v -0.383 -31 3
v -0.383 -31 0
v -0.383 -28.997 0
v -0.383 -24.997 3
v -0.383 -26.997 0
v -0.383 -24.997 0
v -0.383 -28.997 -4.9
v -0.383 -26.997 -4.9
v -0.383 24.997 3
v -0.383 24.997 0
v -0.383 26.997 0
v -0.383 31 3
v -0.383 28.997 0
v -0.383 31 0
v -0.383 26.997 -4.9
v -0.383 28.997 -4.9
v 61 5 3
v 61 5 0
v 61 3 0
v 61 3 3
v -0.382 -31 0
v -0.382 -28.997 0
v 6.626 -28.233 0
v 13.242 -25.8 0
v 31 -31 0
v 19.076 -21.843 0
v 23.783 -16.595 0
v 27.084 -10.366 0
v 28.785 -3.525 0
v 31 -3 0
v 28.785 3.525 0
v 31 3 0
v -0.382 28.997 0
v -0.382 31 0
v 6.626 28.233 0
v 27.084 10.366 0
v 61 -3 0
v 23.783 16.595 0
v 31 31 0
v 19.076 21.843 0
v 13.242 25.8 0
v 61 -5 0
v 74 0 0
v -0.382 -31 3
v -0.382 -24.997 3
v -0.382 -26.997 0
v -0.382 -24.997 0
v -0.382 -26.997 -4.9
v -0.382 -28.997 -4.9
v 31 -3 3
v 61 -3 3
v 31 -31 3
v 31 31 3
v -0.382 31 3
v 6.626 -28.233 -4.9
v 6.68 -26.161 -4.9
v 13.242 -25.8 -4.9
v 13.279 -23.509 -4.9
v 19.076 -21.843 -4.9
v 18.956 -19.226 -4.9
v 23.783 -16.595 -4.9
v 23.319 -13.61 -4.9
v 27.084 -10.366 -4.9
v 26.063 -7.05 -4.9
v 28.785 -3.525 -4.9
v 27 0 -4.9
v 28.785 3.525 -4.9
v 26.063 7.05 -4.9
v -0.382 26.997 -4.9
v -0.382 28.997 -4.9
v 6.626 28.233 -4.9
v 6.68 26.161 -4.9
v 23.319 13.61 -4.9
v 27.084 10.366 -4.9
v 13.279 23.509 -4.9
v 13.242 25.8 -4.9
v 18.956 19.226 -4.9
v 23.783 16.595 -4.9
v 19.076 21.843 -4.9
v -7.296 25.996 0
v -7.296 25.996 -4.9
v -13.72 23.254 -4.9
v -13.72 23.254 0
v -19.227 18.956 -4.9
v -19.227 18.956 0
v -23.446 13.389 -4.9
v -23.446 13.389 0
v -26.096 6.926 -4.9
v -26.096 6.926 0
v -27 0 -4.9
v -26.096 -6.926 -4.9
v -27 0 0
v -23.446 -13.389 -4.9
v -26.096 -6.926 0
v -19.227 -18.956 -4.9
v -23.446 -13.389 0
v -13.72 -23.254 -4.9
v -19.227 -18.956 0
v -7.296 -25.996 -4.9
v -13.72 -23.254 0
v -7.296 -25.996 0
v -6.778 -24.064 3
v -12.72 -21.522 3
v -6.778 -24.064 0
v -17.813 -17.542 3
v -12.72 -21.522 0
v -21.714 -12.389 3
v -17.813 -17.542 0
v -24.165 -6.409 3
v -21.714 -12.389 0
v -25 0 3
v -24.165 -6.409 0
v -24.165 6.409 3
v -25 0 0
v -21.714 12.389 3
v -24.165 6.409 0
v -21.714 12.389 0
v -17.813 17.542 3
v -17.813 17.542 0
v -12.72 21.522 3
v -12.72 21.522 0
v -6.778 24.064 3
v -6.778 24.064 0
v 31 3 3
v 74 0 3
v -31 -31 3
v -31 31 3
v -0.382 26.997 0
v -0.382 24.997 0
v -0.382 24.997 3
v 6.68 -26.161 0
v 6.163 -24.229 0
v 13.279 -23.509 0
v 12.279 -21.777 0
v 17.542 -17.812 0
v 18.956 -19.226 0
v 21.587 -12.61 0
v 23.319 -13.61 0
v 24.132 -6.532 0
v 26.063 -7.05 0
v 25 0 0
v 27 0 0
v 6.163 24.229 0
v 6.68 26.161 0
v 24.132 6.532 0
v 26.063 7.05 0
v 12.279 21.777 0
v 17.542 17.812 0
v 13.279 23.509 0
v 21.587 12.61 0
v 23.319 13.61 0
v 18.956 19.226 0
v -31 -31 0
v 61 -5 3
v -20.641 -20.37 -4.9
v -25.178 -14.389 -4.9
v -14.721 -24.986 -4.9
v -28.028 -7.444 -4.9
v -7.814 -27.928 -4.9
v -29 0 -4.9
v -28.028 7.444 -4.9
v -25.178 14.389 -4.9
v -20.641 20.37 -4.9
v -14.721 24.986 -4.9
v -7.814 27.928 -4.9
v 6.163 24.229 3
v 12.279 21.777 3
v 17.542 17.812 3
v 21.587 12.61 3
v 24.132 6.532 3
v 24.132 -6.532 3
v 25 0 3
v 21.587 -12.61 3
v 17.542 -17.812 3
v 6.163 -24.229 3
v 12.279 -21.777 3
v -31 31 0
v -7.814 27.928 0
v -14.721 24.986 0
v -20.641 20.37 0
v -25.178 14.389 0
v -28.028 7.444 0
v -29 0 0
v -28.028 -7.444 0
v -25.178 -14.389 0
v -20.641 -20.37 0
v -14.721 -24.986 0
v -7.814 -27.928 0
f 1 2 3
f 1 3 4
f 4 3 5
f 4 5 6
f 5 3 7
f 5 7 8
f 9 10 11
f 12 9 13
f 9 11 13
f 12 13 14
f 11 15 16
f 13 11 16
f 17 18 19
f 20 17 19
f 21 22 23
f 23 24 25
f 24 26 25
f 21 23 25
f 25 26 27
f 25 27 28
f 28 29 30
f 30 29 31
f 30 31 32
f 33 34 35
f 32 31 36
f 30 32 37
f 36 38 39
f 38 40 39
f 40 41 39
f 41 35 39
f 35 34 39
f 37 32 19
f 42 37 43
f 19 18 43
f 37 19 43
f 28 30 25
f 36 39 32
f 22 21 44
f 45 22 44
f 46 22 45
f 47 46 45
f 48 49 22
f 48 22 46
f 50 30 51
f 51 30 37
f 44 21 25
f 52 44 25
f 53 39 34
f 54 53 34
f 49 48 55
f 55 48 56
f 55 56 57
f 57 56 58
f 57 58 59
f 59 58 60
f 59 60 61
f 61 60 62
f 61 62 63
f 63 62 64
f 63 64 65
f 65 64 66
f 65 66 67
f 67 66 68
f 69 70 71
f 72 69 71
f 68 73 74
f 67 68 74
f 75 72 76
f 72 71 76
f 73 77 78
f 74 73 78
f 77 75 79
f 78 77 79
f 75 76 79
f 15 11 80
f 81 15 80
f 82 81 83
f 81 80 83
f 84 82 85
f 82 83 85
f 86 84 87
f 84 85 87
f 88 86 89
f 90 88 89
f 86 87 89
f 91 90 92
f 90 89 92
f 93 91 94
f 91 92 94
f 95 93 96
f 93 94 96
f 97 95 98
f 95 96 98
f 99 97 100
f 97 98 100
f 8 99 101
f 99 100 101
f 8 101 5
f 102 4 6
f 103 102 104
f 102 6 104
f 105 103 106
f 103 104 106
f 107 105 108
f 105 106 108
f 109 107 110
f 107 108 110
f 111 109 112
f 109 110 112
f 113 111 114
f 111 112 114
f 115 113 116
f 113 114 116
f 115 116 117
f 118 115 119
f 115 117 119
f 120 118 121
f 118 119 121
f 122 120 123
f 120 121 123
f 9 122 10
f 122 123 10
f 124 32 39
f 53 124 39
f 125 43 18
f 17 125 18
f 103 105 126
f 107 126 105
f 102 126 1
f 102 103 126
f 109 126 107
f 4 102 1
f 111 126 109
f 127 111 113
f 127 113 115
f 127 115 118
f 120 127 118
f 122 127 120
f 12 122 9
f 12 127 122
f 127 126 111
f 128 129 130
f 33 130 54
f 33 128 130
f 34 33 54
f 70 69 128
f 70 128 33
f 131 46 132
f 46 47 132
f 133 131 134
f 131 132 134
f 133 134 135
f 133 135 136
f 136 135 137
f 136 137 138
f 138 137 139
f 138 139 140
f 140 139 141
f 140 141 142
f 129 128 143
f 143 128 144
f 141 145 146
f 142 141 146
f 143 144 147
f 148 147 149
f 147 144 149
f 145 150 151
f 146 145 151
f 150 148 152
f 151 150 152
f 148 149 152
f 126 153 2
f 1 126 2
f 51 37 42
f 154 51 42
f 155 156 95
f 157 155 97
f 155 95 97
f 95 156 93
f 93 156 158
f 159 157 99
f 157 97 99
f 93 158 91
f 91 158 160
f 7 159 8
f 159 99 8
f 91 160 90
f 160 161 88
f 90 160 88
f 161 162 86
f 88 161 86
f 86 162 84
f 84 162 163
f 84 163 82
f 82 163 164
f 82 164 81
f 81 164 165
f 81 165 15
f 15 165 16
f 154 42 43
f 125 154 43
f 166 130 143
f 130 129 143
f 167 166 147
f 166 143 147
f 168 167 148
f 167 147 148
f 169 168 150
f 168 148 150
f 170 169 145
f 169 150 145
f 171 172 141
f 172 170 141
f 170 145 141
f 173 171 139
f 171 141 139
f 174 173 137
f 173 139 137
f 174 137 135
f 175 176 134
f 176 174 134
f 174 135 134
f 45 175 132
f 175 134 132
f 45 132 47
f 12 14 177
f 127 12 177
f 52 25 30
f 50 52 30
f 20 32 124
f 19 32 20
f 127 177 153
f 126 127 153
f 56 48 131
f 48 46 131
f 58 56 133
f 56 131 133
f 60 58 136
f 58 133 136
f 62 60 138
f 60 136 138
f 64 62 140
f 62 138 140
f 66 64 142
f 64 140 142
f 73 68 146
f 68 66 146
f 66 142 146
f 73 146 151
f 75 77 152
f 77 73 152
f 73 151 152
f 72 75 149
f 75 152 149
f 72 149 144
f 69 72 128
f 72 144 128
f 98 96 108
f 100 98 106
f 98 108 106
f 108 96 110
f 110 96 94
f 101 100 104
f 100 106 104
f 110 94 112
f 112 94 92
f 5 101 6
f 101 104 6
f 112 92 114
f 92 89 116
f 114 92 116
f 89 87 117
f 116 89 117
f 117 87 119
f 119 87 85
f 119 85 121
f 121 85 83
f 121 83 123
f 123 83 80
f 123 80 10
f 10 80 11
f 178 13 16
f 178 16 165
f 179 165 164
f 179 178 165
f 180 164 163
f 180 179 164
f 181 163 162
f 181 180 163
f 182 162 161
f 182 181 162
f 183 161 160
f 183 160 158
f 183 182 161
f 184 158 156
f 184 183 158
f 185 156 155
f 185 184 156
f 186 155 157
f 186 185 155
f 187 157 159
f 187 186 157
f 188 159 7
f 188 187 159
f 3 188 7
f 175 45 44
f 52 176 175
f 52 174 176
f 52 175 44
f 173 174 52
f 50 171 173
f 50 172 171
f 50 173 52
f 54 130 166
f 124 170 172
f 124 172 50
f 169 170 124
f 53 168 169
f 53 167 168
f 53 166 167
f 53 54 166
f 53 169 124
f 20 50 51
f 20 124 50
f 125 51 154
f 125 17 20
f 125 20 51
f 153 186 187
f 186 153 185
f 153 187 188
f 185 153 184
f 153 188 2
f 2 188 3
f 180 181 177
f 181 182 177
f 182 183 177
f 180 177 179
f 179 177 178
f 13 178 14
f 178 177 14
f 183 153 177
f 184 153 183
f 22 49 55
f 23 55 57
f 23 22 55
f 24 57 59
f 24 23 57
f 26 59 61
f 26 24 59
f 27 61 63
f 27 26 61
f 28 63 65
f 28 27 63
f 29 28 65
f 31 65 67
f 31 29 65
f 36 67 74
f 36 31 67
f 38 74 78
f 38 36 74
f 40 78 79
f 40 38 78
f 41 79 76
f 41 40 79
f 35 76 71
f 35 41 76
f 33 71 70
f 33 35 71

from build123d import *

# Parameters (mm, degrees)
F0_W     = 30
F0_H     = 3
F1_DEPTH = 3
F2_R     = 29
F2_R_2   = 27
F3_DEPTH = 4.9
F4_W     = 0.001
F4_H     = 500
F5_DEPTH = 25
F6_DEPTH = 25


with BuildPart() as f1:
    # F0 (on Top) → F1 (new body)
    with BuildSketch(Plane.XY):
        with BuildLine():
            ThreePointArc((-25, 0), (0, 25), (25, 0))
            Line((25, 0), (31, 0))
            Line((31, 0), (31, 3))
            Line((31, 3), (31, 31))
            Line((31, 31), (-31, 31))
            Line((-31, 31), (-31, 0))
            Line((-31, 0), (-25, 0))
        make_face()
        with BuildLine():
            Line((31, 0), (25, 0))
            ThreePointArc((25, 0), (0, -25), (-25, 0))
            Line((-25, 0), (-31, 0))
            Line((-31, 0), (-31, -31))
            Line((-31, -31), (31, -31))
            Line((31, -31), (31, -3))
            Line((31, -3), (31, 0))
        make_face()
        with Locations((46, -1.5)):
            Rectangle(F0_W, F0_H)
        with Locations((46, 1.5)):
            Rectangle(F0_W, F0_H)
        Polygon((61, 3), (61, 0), (61, -3), (61, -5), (74, 0), (61, 5), align=None)
    extrude(amount=F1_DEPTH)

    # F2 (on Top) → F3 (join)
    with BuildSketch(Plane.XY):
        Circle(F2_R)
        Circle(F2_R_2, mode=Mode.SUBTRACT)
    extrude(amount=-F3_DEPTH)

    # F4 (on Top) → F5 (cut)
    with BuildSketch(Plane.XY):
        with Locations((-0.382437, 218.174618)):
            Rectangle(F4_W, F4_H)
    extrude(amount=-F5_DEPTH, mode=Mode.SUBTRACT)

    # F4 (on Top) → F6 (cut)
    with BuildSketch(Plane.XY):
        with Locations((-0.382437, 218.174618)):
            Rectangle(F4_W, F4_H)
    extrude(amount=F6_DEPTH, mode=Mode.SUBTRACT)


solid = f1.part
